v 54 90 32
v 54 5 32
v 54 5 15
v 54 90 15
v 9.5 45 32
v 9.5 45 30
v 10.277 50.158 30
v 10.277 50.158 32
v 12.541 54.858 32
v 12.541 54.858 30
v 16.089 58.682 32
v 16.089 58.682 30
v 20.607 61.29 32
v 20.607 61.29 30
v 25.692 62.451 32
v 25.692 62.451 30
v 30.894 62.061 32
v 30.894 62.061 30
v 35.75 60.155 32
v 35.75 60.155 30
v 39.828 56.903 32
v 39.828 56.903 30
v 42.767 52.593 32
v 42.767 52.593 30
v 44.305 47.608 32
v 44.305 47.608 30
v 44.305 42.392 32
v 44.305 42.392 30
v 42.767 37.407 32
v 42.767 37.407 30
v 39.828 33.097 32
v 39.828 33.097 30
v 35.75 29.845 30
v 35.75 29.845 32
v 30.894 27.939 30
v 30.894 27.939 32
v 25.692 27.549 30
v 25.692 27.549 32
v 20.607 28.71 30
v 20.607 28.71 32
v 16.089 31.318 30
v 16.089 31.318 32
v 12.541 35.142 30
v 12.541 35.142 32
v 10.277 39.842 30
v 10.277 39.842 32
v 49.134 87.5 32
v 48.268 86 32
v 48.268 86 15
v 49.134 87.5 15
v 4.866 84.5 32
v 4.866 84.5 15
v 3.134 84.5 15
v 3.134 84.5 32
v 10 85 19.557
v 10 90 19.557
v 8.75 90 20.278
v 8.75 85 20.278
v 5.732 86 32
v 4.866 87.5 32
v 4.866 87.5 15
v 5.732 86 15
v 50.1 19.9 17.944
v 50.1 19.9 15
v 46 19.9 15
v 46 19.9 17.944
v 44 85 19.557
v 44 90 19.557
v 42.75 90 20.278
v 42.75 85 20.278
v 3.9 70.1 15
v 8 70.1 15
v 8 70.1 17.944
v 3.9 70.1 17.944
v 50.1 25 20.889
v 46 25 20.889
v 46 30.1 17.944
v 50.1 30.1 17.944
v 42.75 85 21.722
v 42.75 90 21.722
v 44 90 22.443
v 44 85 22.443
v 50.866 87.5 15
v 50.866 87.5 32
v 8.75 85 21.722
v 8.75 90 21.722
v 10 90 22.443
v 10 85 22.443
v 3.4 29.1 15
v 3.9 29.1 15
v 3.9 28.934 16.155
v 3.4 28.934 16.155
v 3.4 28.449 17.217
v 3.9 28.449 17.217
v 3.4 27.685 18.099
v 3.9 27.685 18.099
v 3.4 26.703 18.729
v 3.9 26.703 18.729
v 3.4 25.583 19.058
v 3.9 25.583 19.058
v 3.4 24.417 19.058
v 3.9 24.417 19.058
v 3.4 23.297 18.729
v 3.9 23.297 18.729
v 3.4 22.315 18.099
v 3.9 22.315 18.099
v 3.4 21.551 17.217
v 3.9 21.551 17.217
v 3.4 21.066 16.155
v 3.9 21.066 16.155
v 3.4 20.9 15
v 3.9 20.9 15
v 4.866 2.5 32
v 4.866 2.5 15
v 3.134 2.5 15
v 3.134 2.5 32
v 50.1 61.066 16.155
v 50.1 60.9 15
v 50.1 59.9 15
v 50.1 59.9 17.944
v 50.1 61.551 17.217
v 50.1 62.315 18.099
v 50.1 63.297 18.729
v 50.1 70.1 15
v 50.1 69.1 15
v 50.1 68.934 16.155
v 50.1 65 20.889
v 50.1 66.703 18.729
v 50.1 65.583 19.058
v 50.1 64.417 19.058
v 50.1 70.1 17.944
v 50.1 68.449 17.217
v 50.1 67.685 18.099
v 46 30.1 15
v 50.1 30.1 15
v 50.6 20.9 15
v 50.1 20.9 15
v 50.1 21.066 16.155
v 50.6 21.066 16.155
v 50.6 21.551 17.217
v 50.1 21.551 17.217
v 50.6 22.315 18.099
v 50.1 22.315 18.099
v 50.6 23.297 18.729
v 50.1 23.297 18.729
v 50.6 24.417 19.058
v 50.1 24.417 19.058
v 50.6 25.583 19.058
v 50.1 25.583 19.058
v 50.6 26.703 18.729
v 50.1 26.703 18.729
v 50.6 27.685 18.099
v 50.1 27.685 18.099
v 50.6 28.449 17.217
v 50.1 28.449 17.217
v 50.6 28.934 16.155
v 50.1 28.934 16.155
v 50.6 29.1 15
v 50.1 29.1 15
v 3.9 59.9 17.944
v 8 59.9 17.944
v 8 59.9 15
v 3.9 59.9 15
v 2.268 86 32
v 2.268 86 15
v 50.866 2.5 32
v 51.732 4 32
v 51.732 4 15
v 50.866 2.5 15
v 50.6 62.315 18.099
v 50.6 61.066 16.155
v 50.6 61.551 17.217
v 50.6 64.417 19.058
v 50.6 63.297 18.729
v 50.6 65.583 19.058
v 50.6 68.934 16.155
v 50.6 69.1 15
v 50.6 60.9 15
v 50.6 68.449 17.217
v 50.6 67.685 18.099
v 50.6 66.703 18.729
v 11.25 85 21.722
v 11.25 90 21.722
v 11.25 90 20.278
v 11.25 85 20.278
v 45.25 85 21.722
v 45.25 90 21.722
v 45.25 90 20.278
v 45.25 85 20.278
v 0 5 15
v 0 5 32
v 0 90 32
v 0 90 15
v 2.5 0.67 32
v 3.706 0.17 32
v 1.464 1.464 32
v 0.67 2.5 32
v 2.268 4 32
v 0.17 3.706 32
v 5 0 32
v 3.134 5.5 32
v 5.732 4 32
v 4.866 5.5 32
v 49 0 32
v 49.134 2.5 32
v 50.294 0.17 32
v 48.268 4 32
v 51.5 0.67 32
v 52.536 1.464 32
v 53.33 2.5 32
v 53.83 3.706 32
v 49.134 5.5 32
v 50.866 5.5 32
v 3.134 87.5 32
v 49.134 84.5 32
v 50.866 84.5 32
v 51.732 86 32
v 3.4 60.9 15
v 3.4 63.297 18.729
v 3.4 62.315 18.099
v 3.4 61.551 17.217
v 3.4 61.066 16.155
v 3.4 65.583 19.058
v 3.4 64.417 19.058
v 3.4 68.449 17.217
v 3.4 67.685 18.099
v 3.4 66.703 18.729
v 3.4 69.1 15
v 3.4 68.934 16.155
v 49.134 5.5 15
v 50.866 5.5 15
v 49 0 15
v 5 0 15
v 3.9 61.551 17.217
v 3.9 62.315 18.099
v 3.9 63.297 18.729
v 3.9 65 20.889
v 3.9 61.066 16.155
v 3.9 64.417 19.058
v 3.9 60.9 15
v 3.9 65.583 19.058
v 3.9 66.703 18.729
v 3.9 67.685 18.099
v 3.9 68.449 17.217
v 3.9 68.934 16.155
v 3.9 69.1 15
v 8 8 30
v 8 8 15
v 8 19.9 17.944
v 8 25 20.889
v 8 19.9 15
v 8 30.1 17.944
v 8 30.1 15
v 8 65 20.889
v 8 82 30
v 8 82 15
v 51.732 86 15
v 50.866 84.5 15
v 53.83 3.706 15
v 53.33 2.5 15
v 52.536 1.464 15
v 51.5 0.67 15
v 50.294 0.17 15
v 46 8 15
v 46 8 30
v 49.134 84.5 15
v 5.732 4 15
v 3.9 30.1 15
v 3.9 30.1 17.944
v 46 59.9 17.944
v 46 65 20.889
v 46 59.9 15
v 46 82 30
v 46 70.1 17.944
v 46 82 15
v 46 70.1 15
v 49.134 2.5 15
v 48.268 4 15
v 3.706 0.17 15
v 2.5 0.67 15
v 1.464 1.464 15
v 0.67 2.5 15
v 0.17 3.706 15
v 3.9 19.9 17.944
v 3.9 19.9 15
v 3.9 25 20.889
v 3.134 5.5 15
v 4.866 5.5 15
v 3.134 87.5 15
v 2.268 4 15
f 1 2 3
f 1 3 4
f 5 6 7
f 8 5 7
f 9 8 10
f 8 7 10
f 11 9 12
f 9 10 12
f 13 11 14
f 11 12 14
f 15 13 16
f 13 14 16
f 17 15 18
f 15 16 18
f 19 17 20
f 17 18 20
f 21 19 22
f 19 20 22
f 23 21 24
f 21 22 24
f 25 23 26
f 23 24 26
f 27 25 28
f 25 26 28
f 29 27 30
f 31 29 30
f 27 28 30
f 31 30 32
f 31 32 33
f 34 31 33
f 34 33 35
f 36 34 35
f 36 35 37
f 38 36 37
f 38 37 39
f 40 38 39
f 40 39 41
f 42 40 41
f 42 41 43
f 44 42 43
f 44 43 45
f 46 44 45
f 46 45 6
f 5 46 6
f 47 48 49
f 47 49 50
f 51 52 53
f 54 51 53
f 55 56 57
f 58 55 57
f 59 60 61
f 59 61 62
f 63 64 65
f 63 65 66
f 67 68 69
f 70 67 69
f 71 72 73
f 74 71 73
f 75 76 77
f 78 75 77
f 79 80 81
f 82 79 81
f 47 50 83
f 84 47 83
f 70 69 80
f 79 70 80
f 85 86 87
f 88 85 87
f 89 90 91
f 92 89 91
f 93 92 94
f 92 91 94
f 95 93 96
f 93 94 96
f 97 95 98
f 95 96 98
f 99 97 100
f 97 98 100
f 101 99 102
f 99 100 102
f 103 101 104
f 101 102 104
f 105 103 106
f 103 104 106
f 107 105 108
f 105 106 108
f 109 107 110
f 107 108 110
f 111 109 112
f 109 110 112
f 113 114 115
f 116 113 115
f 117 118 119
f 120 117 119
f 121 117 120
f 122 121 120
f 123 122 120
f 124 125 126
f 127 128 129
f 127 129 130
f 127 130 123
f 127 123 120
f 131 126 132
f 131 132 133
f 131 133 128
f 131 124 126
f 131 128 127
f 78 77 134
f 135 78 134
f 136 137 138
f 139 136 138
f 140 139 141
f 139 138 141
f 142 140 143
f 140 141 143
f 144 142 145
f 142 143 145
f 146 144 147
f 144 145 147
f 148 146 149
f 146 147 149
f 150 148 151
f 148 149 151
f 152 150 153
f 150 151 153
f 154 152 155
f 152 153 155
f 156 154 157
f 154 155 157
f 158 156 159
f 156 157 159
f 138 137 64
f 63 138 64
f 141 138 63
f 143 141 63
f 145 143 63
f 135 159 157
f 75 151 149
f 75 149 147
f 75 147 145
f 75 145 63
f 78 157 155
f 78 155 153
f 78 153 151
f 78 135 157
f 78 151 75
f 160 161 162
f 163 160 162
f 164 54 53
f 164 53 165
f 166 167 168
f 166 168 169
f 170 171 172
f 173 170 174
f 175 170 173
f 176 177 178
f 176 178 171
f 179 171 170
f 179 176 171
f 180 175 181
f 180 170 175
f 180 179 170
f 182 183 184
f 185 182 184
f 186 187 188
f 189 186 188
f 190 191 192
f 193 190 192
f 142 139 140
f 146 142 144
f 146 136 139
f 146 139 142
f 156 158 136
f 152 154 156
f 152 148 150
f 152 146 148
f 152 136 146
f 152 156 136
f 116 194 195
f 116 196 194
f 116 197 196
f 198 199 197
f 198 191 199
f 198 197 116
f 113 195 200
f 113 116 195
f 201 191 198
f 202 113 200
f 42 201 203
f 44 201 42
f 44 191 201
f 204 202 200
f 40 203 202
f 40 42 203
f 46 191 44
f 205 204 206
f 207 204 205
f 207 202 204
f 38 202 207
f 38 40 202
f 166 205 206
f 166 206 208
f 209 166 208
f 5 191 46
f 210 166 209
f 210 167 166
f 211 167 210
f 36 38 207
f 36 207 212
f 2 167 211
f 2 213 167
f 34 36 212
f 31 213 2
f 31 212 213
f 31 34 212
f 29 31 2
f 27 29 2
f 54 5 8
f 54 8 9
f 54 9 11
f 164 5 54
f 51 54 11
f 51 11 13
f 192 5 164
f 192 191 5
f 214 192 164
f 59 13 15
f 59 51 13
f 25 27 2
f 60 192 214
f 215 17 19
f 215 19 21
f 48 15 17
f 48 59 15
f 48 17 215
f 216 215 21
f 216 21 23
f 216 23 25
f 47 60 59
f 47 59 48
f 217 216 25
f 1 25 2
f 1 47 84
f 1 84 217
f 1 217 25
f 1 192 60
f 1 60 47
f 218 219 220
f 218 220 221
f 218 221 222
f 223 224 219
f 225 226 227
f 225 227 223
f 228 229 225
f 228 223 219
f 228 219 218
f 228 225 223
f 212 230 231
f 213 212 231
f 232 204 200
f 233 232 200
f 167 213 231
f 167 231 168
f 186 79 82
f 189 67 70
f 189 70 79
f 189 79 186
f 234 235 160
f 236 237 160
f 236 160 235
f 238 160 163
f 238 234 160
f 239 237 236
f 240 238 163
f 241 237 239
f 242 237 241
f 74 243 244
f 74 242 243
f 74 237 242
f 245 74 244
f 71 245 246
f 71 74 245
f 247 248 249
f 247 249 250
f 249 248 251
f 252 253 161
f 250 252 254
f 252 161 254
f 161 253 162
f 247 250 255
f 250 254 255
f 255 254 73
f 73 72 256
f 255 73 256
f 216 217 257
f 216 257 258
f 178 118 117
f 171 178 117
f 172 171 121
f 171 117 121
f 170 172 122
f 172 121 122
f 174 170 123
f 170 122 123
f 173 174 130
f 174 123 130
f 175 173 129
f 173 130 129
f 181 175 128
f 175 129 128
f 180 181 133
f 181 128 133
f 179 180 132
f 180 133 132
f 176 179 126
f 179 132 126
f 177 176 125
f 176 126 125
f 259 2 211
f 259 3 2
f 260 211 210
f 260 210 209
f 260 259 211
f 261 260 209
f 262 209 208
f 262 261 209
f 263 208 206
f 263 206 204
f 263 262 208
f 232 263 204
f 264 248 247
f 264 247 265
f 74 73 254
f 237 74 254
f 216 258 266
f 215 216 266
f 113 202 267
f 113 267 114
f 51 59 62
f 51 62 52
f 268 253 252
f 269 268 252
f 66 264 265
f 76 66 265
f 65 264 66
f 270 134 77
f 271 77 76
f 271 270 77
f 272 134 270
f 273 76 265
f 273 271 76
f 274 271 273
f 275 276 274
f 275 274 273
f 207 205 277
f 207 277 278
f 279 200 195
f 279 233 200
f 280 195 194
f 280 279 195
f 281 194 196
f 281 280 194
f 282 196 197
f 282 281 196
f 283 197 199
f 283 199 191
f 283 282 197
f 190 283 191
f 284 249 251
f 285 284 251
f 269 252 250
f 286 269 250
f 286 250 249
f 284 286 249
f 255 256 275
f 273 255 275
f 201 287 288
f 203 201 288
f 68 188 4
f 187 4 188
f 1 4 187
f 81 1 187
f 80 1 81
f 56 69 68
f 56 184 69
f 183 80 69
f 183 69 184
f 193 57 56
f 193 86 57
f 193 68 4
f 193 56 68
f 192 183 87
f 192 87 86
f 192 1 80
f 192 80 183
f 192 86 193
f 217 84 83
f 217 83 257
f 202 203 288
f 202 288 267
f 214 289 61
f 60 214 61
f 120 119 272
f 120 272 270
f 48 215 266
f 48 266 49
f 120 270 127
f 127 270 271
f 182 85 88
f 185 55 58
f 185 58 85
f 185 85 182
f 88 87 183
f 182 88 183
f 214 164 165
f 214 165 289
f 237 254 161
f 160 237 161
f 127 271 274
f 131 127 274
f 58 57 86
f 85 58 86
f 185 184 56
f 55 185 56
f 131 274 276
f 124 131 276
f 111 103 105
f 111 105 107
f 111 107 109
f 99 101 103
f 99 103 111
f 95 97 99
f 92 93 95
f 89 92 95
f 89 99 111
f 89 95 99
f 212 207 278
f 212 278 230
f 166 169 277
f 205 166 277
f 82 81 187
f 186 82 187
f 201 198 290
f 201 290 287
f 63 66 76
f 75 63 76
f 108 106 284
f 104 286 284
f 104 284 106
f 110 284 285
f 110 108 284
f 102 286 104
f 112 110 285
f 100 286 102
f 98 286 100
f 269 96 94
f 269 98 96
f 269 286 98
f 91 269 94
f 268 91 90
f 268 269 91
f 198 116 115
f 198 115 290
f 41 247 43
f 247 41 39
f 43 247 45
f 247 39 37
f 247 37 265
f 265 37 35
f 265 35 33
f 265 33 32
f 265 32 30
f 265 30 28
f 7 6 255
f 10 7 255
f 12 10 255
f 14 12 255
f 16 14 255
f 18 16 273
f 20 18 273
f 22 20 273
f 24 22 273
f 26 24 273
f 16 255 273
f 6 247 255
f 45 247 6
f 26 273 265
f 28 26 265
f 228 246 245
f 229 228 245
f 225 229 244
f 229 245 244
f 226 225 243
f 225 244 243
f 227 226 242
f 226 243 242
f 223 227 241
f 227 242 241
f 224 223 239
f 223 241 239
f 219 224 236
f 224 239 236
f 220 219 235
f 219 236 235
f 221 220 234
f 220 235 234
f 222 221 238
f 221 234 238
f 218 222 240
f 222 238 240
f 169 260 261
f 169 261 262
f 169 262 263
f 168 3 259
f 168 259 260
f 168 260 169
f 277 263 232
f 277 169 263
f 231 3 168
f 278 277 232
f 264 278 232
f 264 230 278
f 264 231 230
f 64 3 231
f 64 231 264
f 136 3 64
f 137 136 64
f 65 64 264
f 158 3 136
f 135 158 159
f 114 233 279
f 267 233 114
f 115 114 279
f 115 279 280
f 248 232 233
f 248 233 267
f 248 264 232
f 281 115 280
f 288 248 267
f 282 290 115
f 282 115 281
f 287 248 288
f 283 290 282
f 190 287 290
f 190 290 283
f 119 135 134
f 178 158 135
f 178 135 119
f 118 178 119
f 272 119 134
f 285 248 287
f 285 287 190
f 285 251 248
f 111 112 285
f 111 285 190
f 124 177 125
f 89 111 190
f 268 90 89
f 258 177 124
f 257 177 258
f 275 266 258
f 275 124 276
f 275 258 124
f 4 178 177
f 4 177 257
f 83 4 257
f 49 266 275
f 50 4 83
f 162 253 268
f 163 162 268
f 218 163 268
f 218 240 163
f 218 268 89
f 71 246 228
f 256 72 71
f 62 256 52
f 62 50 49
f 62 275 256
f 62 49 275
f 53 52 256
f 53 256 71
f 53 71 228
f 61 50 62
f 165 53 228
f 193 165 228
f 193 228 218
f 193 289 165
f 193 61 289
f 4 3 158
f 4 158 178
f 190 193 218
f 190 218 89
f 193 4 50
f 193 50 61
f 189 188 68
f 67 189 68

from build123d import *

# Parameters (mm, degrees)
SKETCH1_W           = 54
SKETCH1_H           = 90
SKETCH1_W_2         = 38
SKETCH1_H_2         = 74
BOSS_EXTRUDE1_DEPTH = 30
CUT_EXTRUDE1_DEPTH  = 4.1
SKETCH5_R           = 4.1
CUT_EXTRUDE2_DEPTH  = 0.5
CUT_EXTRUDE3_DEPTH  = 4.1
SKETCH7_R           = 4.1
CUT_EXTRUDE4_DEPTH  = 0.5
SKETCH8_W           = 54
SKETCH8_H           = 90
BOSS_EXTRUDE2_DEPTH = 2
SKETCH9_W           = 54
SKETCH9_H           = 90
BOSS_EXTRUDE3_DEPTH = 2
SKETCH12_W          = 54
SKETCH12_H          = 90
CUT_EXTRUDE7_DEPTH  = 17
CUT_EXTRUDE8_DEPTH  = 18
SKETCH14_R          = 17.5
CUT_EXTRUDE9_DEPTH  = 3
CUT_EXTRUDE10_DEPTH = 5
FILLET1_R           = 5


with BuildPart() as part:
    # Sketch1 → Boss-Extrude1 (new body)
    with BuildSketch(Plane.XY):
        with Locations((27, 45)):
            Rectangle(SKETCH1_W, SKETCH1_H)
        with Locations((27, 45)):
            Rectangle(SKETCH1_W_2, SKETCH1_H_2, mode=Mode.SUBTRACT)
    extrude(amount=BOSS_EXTRUDE1_DEPTH)

    # Sketch2 → Cut-Extrude1 (cut)
    with BuildSketch(Plane.ZY.offset(-46)):
        Polygon((20.888972746, 65), (17.944486373, 70.1), (12.055513627, 70.1), (9.111027254, 65), (12.055513627, 59.9), (17.944486373, 59.9), align=None)
        Polygon((20.888972746, 25), (17.944486373, 30.1), (12.055513627, 30.1), (9.111027254, 25), (12.055513627, 19.9), (17.944486373, 19.9), align=None)
    extrude(amount=-CUT_EXTRUDE1_DEPTH, mode=Mode.SUBTRACT)

    # Sketch5 → Cut-Extrude2 (cut)
    with BuildSketch(Plane.ZY.offset(-50.1)):
        with Locations((15, 65)):
            Circle(SKETCH5_R)
        with Locations((15, 25)):
            Circle(SKETCH5_R)
    extrude(amount=-CUT_EXTRUDE2_DEPTH, mode=Mode.SUBTRACT)

    # Sketch6 → Cut-Extrude3 (cut)
    with BuildSketch(Plane(origin=(8, 0, 0), x_dir=(0, 0, -1), z_dir=(1, 0, 0))):
        Polygon((-9.111027254, 65), (-12.055513627, 70.1), (-17.944486373, 70.1), (-20.888972746, 65), (-17.944486373, 59.9), (-12.055513627, 59.9), align=None)
        Polygon((-9.111027254, 25), (-12.055513627, 30.1), (-17.944486373, 30.1), (-20.888972746, 25), (-17.944486373, 19.9), (-12.055513627, 19.9), align=None)
    extrude(amount=-CUT_EXTRUDE3_DEPTH, mode=Mode.SUBTRACT)

    # Sketch7 → Cut-Extrude4 (cut)
    with BuildSketch(Plane(origin=(3.9, 0, 0), x_dir=(0, 0, -1), z_dir=(1, 0, 0))):
        with Locations((-15, 65)):
            Circle(SKETCH7_R)
        with Locations((-15, 25)):
            Circle(SKETCH7_R)
    extrude(amount=-CUT_EXTRUDE4_DEPTH, mode=Mode.SUBTRACT)

    # Sketch8 → Boss-Extrude2 (add)
    with BuildSketch(Plane.XY.offset(30)):
        with Locations((27, 45)):
            Rectangle(SKETCH8_W, SKETCH8_H)
    extrude(amount=BOSS_EXTRUDE2_DEPTH)

    # Sketch9 → Boss-Extrude3 (add)
    with BuildSketch(Plane(origin=(0, 0, 0), x_dir=(-1, 0, 0), z_dir=(0, 0, -1))):
        with Locations((-27, 45)):
            Rectangle(SKETCH9_W, SKETCH9_H)
    extrude(amount=BOSS_EXTRUDE3_DEPTH)

    # Sketch12 → Cut-Extrude7 (cut)
    with BuildSketch(Plane(origin=(0, 0, -2), x_dir=(-1, 0, 0), z_dir=(0, 0, -1))):
        with Locations((-27, 45)):
            Rectangle(SKETCH12_W, SKETCH12_H)
    extrude(amount=-CUT_EXTRUDE7_DEPTH, mode=Mode.SUBTRACT)

    # Sketch13 → Cut-Extrude8 (cut, through all)
    with BuildSketch(Plane(origin=(0, 0, 15), x_dir=(-1, 0, 0), z_dir=(0, 0, -1))):
        Polygon((-48.267949192, 86), (-49.133974596, 87.5), (-50.866025404, 87.5), (-51.732050808, 86), (-50.866025404, 84.5), (-49.133974596, 84.5), align=None)
        Polygon((-2.267949192, 86), (-3.133974596, 87.5), (-4.866025404, 87.5), (-5.732050808, 86), (-4.866025404, 84.5), (-3.133974596, 84.5), align=None)
        Polygon((-48.267949192, 4), (-49.133974596, 5.5), (-50.866025404, 5.5), (-51.732050808, 4), (-50.866025404, 2.5), (-49.133974596, 2.5), align=None)
        Polygon((-5.732050808, 4), (-4.866025404, 2.5), (-3.133974596, 2.5), (-2.267949192, 4), (-3.133974596, 5.5), (-4.866025404, 5.5), align=None)
    extrude(amount=-CUT_EXTRUDE8_DEPTH, mode=Mode.SUBTRACT)

    # Sketch14 → Cut-Extrude9 (cut, through all)
    with BuildSketch(Plane(origin=(0, 0, 30), x_dir=(-1, 0, 0), z_dir=(0, 0, -1))):
        with Locations((-27, 45)):
            Circle(SKETCH14_R)
    extrude(amount=-CUT_EXTRUDE9_DEPTH, mode=Mode.SUBTRACT)

    # Sketch15 → Cut-Extrude10 (cut)
    with BuildSketch(Plane(origin=(0, 90, 0), x_dir=(1, 0, 0), z_dir=(0, 1, 0))):
        Polygon((10, -19.556624327), (8.75, -20.278312164), (8.75, -21.721687836), (10, -22.443375673), (11.25, -21.721687836), (11.25, -20.278312164), align=None)
        Polygon((44, -19.556624327), (42.75, -20.278312164), (42.75, -21.721687836), (44, -22.443375673), (45.25, -21.721687836), (45.25, -20.278312164), align=None)
    extrude(amount=-CUT_EXTRUDE10_DEPTH, mode=Mode.SUBTRACT)

    # Fillet1
    fillet1_edges = [part.edges().sort_by_distance(p)[0] for p in [
        (54, 0, 23.5),
        (0, 0, 23.5),
    ]]
    fillet(fillet1_edges, radius=FILLET1_R)


solid = part.part
